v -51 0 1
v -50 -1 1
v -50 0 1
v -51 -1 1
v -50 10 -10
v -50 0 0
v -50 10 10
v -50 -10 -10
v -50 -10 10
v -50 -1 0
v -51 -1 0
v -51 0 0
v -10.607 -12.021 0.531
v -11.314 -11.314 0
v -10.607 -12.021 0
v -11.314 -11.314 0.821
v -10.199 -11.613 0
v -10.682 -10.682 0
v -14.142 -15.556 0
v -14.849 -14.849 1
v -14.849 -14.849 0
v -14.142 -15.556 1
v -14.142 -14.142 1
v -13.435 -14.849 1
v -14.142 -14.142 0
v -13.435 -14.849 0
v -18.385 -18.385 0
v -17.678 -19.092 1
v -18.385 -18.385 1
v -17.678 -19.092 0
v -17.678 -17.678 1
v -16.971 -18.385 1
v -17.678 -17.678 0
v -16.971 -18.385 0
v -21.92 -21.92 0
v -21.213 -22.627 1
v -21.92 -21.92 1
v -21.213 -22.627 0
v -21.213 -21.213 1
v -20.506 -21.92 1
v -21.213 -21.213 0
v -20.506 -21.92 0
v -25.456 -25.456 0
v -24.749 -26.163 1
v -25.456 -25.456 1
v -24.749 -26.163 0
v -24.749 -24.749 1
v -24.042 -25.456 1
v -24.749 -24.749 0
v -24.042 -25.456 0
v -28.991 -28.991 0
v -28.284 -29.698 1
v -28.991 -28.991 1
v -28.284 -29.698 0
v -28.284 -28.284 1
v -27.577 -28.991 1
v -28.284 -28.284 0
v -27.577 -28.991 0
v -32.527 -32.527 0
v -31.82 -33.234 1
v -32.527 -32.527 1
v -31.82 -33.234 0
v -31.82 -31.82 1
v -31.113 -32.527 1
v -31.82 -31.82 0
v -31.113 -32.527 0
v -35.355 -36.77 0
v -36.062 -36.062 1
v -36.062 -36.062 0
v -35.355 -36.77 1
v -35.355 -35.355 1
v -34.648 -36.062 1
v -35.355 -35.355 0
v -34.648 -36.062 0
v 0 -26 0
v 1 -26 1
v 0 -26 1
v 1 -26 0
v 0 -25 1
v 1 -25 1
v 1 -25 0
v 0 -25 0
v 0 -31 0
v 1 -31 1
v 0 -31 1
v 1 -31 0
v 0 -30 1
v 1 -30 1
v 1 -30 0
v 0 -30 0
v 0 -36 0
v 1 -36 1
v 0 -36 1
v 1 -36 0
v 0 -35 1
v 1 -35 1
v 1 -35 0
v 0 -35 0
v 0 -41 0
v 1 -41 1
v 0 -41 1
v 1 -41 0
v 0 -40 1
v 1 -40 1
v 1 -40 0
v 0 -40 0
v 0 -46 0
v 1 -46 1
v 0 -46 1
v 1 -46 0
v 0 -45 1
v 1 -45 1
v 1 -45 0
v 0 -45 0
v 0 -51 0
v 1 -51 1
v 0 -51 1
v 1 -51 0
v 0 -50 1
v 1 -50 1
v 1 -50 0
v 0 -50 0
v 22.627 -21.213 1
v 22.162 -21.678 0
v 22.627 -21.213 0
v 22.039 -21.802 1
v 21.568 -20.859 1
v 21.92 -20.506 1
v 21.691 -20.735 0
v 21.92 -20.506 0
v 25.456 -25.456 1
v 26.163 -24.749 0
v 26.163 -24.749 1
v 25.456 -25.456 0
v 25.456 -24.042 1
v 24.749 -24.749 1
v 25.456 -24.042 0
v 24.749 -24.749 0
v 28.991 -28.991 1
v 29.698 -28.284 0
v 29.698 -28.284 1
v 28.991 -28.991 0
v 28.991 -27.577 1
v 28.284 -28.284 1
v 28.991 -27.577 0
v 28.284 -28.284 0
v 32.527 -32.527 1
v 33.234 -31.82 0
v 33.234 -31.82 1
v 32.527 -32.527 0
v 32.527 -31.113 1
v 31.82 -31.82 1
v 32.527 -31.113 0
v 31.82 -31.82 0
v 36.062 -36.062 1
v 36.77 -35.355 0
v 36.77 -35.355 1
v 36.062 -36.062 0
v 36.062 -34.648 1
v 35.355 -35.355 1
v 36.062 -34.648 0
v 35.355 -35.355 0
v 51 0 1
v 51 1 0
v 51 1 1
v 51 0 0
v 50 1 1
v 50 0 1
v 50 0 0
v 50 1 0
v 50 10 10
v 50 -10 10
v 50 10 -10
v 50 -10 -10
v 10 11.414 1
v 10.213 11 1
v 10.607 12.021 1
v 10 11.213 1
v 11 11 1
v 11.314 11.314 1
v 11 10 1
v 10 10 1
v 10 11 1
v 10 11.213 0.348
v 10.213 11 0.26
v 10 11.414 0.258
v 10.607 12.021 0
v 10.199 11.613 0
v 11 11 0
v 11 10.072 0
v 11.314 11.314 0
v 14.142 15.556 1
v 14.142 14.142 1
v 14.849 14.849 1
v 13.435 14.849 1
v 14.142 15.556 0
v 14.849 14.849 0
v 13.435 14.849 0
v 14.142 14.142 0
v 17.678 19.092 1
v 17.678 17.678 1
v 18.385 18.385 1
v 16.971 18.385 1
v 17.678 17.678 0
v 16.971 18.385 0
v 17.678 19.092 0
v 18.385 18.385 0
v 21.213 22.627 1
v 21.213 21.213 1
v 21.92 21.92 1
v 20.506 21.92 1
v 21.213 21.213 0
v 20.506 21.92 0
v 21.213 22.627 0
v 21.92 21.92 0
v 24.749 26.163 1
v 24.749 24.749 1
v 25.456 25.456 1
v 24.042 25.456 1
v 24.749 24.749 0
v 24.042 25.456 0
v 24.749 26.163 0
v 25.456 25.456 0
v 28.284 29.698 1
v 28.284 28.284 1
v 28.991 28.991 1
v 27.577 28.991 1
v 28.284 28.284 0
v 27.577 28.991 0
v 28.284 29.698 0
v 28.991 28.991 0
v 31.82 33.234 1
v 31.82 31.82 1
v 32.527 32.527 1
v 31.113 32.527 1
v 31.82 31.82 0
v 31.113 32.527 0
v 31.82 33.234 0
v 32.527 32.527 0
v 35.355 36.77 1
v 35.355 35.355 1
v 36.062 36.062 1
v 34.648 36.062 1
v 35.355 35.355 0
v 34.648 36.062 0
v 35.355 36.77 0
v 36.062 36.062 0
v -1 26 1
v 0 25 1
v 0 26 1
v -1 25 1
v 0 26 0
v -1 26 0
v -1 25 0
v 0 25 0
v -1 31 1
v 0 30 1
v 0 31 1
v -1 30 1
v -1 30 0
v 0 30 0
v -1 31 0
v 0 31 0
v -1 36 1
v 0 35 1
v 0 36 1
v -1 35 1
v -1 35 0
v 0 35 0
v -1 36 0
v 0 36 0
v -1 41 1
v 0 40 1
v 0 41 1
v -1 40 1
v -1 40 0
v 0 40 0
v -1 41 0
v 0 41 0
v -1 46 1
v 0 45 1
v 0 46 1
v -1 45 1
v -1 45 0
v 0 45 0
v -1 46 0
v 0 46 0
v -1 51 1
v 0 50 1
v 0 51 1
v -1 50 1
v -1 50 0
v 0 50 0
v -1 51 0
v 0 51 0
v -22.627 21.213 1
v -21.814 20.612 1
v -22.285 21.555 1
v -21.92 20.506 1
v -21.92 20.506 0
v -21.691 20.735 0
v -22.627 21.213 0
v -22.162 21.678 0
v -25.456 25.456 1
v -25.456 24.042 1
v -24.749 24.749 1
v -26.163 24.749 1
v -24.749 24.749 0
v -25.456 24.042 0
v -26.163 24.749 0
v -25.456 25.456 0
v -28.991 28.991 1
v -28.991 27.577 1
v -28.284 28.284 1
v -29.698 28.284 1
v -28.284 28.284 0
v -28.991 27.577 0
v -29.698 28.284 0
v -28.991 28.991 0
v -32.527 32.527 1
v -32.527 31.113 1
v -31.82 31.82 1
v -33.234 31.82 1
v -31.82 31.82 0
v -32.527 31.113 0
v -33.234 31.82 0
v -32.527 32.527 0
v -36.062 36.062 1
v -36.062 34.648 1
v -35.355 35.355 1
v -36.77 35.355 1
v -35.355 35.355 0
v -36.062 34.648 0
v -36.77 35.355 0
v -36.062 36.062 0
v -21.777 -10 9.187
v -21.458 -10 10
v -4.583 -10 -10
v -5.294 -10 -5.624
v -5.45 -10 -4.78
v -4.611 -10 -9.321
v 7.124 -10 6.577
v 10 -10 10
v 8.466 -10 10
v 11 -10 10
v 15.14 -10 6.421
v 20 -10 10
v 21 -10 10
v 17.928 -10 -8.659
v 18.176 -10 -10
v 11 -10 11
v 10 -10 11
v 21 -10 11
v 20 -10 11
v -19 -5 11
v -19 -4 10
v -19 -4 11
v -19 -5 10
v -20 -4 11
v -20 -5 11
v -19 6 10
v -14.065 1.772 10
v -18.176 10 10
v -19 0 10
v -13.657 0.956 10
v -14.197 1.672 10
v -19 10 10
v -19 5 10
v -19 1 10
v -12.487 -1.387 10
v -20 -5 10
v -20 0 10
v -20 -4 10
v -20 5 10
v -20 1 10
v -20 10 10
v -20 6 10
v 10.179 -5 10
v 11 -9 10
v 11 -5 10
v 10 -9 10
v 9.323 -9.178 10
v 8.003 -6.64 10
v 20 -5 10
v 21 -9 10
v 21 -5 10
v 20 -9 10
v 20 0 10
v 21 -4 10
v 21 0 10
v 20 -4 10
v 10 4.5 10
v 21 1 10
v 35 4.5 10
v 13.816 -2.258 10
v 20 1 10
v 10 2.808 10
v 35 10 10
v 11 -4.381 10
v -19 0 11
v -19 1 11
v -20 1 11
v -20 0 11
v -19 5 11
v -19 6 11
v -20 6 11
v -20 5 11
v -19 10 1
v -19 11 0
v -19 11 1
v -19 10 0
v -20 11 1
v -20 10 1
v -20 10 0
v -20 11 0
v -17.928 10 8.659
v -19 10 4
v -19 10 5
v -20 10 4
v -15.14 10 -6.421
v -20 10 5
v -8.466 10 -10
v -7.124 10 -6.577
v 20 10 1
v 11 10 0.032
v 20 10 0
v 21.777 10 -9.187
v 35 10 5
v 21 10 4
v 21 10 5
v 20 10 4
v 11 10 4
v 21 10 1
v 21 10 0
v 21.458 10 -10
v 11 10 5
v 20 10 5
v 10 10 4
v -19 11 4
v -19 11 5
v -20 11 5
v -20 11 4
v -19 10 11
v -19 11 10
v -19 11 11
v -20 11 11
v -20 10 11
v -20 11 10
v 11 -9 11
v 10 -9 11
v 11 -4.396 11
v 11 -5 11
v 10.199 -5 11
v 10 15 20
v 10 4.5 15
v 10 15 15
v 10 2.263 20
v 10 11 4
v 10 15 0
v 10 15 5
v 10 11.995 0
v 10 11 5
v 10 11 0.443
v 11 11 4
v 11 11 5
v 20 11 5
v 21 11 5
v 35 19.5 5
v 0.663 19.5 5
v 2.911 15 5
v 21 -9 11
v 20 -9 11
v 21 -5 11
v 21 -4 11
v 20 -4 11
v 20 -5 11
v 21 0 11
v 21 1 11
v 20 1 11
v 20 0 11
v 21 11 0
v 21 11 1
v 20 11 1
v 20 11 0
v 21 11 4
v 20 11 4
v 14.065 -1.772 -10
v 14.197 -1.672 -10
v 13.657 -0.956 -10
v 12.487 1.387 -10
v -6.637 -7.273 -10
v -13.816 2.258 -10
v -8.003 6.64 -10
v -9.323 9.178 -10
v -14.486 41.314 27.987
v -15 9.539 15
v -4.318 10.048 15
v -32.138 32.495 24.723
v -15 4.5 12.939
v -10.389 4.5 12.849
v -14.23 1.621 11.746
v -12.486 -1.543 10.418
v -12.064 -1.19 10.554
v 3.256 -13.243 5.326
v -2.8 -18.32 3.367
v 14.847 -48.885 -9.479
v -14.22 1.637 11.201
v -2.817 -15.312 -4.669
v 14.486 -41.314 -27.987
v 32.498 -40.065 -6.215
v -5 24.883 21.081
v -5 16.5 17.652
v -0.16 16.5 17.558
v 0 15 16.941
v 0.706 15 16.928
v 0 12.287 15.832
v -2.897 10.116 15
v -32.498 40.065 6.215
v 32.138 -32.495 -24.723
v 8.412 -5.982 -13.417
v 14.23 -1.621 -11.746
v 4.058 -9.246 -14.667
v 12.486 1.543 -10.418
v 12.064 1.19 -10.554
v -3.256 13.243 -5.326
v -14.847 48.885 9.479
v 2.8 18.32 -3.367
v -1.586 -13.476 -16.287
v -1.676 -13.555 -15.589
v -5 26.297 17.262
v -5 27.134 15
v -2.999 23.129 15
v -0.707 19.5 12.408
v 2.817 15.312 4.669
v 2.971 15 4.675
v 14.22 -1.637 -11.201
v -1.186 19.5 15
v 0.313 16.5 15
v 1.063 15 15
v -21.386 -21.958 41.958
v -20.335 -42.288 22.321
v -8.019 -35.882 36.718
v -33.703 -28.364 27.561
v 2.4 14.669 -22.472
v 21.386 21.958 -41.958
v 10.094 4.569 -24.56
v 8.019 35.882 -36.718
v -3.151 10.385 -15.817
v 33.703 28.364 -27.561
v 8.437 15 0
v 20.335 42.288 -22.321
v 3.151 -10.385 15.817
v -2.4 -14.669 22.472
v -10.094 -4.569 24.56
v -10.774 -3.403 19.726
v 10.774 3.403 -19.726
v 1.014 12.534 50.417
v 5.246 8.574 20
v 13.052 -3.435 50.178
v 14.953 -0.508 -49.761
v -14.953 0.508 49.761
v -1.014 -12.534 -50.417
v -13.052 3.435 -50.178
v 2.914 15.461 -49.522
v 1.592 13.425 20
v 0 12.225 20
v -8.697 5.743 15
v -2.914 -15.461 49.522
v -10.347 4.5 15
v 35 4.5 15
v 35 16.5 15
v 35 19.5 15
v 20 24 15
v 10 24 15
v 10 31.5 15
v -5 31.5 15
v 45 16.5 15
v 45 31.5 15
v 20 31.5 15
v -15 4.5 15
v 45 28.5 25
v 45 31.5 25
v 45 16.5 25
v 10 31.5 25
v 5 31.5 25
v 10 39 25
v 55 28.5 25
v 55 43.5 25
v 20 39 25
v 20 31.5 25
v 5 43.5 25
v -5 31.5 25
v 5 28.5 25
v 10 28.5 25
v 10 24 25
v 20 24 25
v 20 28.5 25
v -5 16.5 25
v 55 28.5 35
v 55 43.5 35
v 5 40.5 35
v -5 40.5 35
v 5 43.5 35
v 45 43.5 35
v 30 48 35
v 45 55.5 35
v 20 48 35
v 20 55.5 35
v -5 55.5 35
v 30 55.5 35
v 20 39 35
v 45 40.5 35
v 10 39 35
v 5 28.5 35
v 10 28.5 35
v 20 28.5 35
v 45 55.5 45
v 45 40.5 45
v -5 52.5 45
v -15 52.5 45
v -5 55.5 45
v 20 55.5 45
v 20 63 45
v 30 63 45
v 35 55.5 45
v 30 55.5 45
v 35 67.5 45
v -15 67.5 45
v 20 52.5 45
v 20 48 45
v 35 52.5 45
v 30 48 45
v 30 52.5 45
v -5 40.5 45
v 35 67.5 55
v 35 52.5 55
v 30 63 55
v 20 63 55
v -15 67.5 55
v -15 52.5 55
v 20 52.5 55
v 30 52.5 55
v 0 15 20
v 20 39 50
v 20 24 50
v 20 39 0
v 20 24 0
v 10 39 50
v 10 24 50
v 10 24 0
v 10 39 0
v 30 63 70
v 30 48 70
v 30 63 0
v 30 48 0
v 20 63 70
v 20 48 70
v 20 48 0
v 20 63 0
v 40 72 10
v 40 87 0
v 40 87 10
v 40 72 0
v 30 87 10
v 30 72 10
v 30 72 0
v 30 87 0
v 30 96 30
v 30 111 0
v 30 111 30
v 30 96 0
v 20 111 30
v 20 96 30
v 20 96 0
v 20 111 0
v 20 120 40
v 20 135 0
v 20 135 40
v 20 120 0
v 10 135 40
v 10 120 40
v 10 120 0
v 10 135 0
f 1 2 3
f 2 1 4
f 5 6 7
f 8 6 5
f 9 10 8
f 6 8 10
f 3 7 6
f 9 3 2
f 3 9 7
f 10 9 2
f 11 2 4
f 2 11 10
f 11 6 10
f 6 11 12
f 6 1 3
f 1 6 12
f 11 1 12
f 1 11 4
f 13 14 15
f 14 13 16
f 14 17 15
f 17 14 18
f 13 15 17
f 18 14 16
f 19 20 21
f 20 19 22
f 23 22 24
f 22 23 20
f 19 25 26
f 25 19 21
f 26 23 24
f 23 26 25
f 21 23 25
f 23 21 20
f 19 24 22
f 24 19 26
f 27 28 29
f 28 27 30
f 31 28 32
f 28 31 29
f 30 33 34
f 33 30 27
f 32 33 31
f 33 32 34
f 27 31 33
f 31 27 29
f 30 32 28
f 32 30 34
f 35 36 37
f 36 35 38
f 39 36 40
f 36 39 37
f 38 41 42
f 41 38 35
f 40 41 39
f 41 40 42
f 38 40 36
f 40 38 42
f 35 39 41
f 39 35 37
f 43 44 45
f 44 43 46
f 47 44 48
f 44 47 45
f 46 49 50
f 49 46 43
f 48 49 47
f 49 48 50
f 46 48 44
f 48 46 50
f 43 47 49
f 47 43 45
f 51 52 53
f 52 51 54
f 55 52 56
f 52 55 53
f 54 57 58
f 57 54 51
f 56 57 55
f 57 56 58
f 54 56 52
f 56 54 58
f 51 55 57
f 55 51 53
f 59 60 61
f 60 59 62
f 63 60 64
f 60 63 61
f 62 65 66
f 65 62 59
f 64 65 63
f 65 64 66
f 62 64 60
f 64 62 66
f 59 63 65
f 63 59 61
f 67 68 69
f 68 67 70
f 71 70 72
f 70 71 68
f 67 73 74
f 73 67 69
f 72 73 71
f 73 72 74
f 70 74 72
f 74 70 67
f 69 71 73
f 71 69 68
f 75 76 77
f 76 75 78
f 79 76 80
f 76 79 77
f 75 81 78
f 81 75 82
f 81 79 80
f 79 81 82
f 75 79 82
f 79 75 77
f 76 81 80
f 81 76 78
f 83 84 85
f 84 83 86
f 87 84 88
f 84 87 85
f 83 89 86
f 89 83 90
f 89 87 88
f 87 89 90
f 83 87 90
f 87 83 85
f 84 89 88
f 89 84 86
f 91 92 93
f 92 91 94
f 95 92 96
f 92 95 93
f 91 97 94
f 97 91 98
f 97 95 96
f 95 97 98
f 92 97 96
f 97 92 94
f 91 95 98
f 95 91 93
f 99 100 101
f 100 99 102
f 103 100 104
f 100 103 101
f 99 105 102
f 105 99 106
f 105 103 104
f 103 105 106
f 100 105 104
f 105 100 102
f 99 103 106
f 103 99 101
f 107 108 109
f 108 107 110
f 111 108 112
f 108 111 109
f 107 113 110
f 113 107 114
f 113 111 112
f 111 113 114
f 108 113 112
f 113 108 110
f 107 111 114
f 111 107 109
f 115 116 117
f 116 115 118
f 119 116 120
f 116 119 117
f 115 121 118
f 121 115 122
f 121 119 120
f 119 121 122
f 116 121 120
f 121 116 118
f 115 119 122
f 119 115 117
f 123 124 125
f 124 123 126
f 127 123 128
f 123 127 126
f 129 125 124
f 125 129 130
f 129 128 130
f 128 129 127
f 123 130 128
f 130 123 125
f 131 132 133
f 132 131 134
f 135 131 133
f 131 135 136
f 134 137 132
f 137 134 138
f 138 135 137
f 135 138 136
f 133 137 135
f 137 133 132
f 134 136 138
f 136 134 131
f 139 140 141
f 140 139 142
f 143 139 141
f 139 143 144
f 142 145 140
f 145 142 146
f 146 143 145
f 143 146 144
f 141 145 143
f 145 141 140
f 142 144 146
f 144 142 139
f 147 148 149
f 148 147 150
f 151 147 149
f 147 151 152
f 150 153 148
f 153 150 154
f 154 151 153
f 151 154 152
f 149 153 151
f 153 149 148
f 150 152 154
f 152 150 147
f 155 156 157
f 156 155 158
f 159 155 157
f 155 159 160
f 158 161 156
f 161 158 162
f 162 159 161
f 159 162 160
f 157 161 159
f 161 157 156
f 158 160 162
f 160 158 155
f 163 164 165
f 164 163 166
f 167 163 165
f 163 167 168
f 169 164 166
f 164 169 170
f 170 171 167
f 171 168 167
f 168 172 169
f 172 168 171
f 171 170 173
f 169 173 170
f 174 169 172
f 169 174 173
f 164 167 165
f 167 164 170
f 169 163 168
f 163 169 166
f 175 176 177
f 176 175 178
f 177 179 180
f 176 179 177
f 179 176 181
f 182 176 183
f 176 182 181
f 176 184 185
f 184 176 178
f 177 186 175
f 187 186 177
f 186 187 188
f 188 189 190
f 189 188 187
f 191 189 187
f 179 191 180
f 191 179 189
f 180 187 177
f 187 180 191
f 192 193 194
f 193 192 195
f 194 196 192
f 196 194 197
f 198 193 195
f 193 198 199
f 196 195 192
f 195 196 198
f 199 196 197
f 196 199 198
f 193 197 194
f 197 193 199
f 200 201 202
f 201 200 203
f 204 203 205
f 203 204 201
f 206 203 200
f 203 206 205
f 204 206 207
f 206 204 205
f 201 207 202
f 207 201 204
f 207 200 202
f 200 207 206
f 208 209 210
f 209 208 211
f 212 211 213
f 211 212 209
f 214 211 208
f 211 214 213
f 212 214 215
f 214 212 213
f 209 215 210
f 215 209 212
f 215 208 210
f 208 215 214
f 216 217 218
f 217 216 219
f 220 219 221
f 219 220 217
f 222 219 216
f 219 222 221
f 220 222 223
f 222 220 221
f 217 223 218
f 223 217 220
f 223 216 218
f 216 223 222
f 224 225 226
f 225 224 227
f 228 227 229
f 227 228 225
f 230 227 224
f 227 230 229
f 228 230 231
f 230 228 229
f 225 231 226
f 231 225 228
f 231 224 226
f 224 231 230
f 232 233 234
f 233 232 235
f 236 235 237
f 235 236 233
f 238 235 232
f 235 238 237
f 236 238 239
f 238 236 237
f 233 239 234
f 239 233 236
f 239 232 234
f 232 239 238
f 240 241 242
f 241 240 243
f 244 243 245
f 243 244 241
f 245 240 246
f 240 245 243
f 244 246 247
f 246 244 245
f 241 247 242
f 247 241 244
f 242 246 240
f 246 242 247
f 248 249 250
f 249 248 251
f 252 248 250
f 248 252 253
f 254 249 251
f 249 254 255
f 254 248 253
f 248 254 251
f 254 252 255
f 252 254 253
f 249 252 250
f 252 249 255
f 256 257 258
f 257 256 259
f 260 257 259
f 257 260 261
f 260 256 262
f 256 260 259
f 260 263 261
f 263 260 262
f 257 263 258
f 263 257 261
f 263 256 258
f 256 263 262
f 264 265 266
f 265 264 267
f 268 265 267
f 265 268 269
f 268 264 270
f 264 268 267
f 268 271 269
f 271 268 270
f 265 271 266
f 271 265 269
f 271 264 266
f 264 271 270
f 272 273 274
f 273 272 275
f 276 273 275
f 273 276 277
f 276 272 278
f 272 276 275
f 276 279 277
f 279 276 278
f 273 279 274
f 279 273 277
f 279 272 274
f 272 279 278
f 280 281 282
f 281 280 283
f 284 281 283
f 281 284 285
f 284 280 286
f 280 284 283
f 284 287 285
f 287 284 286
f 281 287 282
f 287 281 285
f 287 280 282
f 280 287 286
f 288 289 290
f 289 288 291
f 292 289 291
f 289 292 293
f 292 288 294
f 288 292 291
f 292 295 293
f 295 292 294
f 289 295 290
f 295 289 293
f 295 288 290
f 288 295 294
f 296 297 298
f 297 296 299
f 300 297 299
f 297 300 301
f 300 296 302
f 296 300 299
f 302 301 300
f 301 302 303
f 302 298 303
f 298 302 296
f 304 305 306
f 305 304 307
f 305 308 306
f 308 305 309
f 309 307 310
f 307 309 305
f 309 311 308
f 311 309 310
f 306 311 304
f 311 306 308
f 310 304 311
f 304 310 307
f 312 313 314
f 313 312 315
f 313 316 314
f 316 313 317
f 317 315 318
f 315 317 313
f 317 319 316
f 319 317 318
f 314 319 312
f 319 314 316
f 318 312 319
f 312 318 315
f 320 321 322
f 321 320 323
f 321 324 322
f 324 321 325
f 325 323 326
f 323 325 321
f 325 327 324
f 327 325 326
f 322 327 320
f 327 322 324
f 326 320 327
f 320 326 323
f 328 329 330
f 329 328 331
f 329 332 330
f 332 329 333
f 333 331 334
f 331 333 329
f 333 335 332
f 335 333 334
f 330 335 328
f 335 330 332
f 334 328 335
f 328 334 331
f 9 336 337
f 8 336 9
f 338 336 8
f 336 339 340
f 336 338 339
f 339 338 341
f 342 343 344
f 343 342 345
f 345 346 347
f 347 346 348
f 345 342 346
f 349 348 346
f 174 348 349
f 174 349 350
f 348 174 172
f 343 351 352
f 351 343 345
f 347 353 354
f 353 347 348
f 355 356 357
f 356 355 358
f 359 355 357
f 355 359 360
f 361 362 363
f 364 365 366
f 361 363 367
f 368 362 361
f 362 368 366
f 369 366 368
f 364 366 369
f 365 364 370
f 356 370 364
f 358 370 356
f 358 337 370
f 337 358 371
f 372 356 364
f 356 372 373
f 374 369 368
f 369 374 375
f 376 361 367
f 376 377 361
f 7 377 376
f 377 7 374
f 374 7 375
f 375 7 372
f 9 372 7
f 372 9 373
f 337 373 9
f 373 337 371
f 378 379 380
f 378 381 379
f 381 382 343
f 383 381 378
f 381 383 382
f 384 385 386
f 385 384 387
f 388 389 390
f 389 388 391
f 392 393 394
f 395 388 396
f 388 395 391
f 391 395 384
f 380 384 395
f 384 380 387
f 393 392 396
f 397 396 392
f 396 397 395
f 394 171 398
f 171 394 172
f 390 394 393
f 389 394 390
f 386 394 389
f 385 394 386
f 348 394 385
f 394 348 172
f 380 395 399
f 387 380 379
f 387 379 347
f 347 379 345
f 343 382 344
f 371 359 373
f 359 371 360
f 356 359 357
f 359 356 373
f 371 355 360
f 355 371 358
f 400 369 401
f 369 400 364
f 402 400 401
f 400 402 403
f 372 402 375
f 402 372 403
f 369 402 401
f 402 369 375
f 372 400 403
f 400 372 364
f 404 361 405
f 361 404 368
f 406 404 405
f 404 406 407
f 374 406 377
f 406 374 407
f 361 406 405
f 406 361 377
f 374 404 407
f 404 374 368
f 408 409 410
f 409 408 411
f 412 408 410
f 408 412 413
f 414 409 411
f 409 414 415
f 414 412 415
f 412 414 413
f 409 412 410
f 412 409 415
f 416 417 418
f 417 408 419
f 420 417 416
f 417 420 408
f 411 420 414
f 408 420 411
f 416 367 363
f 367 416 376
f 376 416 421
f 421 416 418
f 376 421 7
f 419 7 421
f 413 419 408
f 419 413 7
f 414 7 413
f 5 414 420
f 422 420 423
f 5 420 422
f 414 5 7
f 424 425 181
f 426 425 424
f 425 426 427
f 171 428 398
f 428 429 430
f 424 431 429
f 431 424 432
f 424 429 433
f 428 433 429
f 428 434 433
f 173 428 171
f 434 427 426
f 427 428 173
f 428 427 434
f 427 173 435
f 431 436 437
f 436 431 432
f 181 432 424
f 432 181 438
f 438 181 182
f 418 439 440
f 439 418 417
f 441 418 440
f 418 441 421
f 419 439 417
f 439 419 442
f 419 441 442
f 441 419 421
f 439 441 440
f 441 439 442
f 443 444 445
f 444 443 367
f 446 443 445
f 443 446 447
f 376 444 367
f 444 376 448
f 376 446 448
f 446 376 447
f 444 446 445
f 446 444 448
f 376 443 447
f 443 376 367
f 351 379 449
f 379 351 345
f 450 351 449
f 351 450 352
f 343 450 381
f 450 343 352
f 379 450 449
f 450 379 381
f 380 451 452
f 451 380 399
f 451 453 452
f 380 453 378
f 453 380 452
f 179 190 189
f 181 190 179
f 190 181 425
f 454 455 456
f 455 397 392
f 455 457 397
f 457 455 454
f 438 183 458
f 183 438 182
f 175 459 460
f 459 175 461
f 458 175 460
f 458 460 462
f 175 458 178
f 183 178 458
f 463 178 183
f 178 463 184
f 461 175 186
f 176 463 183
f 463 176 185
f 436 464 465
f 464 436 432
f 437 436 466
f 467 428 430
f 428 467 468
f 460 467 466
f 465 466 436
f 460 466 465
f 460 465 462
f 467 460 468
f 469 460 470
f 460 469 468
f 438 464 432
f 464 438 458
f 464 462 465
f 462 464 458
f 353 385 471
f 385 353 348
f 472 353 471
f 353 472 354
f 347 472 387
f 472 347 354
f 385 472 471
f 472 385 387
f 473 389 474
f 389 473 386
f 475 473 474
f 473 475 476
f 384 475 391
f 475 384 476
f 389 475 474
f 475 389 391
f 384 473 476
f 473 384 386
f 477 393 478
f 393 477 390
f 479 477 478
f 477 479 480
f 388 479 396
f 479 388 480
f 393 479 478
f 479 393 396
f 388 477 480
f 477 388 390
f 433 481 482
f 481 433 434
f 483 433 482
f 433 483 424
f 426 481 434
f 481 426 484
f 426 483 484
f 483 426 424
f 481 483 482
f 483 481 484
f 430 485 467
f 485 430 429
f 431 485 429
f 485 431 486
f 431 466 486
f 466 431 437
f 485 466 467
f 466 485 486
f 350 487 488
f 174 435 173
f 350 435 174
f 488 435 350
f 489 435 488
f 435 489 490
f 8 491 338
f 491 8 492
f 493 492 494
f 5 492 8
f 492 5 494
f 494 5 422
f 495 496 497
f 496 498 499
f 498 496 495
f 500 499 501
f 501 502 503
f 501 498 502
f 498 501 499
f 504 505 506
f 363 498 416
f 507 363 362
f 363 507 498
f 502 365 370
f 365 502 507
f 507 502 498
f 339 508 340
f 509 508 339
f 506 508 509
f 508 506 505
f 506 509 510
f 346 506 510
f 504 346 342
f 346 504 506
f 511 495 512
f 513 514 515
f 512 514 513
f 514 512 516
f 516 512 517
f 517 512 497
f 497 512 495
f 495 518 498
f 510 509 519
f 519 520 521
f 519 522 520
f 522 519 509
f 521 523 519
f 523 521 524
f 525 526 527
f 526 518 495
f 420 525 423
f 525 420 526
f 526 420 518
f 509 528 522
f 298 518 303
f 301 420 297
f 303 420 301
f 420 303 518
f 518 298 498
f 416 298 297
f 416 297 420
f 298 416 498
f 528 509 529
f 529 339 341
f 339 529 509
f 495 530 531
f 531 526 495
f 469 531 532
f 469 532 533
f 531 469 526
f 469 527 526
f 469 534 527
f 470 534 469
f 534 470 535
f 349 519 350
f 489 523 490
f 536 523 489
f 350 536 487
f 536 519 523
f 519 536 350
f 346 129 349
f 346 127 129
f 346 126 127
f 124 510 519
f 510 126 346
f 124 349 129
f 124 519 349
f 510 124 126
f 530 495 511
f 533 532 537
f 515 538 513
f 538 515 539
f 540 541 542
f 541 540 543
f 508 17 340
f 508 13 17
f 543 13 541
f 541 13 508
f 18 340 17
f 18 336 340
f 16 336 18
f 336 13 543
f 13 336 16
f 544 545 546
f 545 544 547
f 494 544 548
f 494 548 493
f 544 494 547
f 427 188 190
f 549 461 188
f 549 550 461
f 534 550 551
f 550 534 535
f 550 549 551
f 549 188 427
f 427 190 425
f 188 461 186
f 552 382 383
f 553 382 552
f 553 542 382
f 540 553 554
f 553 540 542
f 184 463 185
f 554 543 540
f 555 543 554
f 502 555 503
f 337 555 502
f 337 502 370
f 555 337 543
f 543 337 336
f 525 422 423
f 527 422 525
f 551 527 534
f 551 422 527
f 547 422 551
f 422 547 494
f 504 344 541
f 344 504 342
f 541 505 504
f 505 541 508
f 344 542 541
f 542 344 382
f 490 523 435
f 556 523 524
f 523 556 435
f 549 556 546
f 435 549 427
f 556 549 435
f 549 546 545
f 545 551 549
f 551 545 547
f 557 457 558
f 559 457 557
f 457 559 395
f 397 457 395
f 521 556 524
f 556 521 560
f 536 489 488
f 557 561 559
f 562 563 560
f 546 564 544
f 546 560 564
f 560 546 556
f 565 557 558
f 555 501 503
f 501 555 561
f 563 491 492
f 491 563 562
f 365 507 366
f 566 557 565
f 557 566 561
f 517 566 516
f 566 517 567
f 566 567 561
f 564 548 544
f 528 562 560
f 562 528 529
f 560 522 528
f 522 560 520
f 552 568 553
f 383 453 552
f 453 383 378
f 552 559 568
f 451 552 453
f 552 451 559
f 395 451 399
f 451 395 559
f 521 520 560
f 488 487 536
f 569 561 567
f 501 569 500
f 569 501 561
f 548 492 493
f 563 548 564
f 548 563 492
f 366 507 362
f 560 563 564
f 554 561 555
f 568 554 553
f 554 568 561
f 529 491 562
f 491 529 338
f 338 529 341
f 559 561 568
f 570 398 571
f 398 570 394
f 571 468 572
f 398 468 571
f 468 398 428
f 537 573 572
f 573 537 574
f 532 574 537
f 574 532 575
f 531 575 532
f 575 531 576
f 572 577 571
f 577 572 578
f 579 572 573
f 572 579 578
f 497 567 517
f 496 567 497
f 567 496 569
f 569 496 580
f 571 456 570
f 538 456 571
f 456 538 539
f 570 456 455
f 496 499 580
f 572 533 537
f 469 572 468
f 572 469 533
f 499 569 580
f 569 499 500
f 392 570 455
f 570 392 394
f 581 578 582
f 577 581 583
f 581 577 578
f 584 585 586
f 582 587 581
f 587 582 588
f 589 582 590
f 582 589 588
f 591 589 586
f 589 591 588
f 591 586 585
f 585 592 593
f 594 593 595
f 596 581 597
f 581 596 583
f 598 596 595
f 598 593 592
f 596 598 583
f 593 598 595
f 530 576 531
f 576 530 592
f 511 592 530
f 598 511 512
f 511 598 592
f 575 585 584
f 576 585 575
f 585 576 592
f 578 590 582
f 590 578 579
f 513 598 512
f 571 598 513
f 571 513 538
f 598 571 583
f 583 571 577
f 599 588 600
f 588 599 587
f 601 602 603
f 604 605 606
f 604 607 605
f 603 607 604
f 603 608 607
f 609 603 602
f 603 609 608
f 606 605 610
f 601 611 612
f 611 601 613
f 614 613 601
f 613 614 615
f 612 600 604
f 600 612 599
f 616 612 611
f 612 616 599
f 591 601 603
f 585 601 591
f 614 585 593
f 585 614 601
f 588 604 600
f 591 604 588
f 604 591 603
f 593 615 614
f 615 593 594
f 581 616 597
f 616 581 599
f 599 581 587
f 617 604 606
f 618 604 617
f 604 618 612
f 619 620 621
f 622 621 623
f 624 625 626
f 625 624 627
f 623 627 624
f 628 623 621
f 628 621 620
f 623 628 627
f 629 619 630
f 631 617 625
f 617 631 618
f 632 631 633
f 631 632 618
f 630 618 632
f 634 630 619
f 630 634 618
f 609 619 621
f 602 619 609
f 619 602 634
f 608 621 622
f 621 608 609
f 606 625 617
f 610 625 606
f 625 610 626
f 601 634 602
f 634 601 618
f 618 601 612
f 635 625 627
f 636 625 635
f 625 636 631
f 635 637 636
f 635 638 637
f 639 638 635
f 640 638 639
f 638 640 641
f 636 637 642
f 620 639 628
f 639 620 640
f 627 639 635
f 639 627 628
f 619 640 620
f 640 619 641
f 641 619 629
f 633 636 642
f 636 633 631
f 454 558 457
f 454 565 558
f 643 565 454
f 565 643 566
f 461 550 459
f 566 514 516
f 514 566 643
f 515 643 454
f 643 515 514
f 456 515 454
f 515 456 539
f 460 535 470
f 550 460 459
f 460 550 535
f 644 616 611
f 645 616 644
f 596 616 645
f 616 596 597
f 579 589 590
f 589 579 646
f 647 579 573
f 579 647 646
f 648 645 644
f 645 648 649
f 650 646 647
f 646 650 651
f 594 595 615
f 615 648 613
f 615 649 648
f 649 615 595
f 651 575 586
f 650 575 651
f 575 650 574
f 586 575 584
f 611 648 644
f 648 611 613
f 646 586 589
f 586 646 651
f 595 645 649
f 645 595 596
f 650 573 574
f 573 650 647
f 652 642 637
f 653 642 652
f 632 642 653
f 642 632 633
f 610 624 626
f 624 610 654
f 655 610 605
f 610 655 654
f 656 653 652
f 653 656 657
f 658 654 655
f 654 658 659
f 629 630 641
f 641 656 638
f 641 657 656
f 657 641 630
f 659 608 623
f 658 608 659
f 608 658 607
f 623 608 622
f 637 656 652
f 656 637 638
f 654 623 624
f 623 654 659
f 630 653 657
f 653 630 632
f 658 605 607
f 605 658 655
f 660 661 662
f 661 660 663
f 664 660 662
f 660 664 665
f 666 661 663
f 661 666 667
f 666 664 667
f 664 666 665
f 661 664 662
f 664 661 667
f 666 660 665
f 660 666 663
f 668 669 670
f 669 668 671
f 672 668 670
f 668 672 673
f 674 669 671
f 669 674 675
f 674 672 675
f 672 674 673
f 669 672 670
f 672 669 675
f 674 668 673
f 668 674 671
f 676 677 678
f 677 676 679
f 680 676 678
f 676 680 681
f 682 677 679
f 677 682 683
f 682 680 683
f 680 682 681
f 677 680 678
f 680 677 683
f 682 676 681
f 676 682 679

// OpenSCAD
for (a = [3:5])echo(a);     // 3 4 5
for (a = [3:0]) {echo(a);}   // 0 1 2 3         start > end is invalid, deprecated by 2015.3
for (a = [3:0.5:5])echo(a); // 3 3.5 4 4.5 5
for (a = [0:2:5])echo(a);   // 0 2 4
for (a = [3:- 2:- 1])echo(a); // 3 1 -1

for (a = [3, 4, 1, 5])echo(a); // 3 4 1 5
for (a = [0.3, PI, 1, 99]) {echo(a);}    // 0.3 3.14159 1 99
x1 = 2; x2 = 8; x3 = 5.5;
for (a = [x1, x2, x3]) {echo(a);} // 2 8 5.5
for (a = [[1, 2], 6, "s", [[3, 4], [5, 6]]])echo(a);  // [1,2] 6 "s" [[3,4],[5,6]]

animals = ["elephants", "snakes", "tigers", "giraffes"];
for (animal = animals)
echo(str("I've been to the zoo and saw ", animal)); // "I've been to the zoo and saw elephants", for each animal

for (i = [0:3])
translate([i * 10, 0, 0])
    cube(i + 1);

for (z = [- 180:45:+ 180])
for (x = [10:5:50])
rotate([0, 0, z]) translate([x, 0, 0]) cube(1);

color_vec = ["black", "red", "blue", "green", "pink", "purple"];
for (x = [- 20:10:20])
for (y = [0:4])color(color_vec[y])
    for (z = [0, 4, 10])
    {translate([x, y * 5 - 10, z])cube();}

color_vec = ["black", "red", "blue", "green", "pink", "purple"];
for (x = [- 20:10:20],
    y = [0:4],
    z = [0, 4, 10])
translate([x, y * 5 - 10, z]) {color(color_vec[y])cube();}

for (i = [[0, 0, 0],
        [10, 20, 300],
        [200, 40, 57],
        [20, 88, 57]])
{
    rotate(i)
        cube([100, 20, 20], center = true);
}

for (i = [[0, 0, 0],
        [10, 12, 10],
        [20, 24, 20],
        [30, 36, 30],
        [20, 48, 40],
        [10, 60, 50]])
{
    translate(i)
        cube([50, 15, 10], center = true);
}

for (i = [[[0, 0, 0], 20],
        [[10, 12, 10], 50],
        [[20, 24, 20], 70],
        [[30, 36, 30], 10],
        [[20, 48, 40], 30],
        [[10, 60, 50], 40]])
{
    translate([i[0][0], 2 * i[0][1], 0])
        cube([10, 15, i[1]]);
}
